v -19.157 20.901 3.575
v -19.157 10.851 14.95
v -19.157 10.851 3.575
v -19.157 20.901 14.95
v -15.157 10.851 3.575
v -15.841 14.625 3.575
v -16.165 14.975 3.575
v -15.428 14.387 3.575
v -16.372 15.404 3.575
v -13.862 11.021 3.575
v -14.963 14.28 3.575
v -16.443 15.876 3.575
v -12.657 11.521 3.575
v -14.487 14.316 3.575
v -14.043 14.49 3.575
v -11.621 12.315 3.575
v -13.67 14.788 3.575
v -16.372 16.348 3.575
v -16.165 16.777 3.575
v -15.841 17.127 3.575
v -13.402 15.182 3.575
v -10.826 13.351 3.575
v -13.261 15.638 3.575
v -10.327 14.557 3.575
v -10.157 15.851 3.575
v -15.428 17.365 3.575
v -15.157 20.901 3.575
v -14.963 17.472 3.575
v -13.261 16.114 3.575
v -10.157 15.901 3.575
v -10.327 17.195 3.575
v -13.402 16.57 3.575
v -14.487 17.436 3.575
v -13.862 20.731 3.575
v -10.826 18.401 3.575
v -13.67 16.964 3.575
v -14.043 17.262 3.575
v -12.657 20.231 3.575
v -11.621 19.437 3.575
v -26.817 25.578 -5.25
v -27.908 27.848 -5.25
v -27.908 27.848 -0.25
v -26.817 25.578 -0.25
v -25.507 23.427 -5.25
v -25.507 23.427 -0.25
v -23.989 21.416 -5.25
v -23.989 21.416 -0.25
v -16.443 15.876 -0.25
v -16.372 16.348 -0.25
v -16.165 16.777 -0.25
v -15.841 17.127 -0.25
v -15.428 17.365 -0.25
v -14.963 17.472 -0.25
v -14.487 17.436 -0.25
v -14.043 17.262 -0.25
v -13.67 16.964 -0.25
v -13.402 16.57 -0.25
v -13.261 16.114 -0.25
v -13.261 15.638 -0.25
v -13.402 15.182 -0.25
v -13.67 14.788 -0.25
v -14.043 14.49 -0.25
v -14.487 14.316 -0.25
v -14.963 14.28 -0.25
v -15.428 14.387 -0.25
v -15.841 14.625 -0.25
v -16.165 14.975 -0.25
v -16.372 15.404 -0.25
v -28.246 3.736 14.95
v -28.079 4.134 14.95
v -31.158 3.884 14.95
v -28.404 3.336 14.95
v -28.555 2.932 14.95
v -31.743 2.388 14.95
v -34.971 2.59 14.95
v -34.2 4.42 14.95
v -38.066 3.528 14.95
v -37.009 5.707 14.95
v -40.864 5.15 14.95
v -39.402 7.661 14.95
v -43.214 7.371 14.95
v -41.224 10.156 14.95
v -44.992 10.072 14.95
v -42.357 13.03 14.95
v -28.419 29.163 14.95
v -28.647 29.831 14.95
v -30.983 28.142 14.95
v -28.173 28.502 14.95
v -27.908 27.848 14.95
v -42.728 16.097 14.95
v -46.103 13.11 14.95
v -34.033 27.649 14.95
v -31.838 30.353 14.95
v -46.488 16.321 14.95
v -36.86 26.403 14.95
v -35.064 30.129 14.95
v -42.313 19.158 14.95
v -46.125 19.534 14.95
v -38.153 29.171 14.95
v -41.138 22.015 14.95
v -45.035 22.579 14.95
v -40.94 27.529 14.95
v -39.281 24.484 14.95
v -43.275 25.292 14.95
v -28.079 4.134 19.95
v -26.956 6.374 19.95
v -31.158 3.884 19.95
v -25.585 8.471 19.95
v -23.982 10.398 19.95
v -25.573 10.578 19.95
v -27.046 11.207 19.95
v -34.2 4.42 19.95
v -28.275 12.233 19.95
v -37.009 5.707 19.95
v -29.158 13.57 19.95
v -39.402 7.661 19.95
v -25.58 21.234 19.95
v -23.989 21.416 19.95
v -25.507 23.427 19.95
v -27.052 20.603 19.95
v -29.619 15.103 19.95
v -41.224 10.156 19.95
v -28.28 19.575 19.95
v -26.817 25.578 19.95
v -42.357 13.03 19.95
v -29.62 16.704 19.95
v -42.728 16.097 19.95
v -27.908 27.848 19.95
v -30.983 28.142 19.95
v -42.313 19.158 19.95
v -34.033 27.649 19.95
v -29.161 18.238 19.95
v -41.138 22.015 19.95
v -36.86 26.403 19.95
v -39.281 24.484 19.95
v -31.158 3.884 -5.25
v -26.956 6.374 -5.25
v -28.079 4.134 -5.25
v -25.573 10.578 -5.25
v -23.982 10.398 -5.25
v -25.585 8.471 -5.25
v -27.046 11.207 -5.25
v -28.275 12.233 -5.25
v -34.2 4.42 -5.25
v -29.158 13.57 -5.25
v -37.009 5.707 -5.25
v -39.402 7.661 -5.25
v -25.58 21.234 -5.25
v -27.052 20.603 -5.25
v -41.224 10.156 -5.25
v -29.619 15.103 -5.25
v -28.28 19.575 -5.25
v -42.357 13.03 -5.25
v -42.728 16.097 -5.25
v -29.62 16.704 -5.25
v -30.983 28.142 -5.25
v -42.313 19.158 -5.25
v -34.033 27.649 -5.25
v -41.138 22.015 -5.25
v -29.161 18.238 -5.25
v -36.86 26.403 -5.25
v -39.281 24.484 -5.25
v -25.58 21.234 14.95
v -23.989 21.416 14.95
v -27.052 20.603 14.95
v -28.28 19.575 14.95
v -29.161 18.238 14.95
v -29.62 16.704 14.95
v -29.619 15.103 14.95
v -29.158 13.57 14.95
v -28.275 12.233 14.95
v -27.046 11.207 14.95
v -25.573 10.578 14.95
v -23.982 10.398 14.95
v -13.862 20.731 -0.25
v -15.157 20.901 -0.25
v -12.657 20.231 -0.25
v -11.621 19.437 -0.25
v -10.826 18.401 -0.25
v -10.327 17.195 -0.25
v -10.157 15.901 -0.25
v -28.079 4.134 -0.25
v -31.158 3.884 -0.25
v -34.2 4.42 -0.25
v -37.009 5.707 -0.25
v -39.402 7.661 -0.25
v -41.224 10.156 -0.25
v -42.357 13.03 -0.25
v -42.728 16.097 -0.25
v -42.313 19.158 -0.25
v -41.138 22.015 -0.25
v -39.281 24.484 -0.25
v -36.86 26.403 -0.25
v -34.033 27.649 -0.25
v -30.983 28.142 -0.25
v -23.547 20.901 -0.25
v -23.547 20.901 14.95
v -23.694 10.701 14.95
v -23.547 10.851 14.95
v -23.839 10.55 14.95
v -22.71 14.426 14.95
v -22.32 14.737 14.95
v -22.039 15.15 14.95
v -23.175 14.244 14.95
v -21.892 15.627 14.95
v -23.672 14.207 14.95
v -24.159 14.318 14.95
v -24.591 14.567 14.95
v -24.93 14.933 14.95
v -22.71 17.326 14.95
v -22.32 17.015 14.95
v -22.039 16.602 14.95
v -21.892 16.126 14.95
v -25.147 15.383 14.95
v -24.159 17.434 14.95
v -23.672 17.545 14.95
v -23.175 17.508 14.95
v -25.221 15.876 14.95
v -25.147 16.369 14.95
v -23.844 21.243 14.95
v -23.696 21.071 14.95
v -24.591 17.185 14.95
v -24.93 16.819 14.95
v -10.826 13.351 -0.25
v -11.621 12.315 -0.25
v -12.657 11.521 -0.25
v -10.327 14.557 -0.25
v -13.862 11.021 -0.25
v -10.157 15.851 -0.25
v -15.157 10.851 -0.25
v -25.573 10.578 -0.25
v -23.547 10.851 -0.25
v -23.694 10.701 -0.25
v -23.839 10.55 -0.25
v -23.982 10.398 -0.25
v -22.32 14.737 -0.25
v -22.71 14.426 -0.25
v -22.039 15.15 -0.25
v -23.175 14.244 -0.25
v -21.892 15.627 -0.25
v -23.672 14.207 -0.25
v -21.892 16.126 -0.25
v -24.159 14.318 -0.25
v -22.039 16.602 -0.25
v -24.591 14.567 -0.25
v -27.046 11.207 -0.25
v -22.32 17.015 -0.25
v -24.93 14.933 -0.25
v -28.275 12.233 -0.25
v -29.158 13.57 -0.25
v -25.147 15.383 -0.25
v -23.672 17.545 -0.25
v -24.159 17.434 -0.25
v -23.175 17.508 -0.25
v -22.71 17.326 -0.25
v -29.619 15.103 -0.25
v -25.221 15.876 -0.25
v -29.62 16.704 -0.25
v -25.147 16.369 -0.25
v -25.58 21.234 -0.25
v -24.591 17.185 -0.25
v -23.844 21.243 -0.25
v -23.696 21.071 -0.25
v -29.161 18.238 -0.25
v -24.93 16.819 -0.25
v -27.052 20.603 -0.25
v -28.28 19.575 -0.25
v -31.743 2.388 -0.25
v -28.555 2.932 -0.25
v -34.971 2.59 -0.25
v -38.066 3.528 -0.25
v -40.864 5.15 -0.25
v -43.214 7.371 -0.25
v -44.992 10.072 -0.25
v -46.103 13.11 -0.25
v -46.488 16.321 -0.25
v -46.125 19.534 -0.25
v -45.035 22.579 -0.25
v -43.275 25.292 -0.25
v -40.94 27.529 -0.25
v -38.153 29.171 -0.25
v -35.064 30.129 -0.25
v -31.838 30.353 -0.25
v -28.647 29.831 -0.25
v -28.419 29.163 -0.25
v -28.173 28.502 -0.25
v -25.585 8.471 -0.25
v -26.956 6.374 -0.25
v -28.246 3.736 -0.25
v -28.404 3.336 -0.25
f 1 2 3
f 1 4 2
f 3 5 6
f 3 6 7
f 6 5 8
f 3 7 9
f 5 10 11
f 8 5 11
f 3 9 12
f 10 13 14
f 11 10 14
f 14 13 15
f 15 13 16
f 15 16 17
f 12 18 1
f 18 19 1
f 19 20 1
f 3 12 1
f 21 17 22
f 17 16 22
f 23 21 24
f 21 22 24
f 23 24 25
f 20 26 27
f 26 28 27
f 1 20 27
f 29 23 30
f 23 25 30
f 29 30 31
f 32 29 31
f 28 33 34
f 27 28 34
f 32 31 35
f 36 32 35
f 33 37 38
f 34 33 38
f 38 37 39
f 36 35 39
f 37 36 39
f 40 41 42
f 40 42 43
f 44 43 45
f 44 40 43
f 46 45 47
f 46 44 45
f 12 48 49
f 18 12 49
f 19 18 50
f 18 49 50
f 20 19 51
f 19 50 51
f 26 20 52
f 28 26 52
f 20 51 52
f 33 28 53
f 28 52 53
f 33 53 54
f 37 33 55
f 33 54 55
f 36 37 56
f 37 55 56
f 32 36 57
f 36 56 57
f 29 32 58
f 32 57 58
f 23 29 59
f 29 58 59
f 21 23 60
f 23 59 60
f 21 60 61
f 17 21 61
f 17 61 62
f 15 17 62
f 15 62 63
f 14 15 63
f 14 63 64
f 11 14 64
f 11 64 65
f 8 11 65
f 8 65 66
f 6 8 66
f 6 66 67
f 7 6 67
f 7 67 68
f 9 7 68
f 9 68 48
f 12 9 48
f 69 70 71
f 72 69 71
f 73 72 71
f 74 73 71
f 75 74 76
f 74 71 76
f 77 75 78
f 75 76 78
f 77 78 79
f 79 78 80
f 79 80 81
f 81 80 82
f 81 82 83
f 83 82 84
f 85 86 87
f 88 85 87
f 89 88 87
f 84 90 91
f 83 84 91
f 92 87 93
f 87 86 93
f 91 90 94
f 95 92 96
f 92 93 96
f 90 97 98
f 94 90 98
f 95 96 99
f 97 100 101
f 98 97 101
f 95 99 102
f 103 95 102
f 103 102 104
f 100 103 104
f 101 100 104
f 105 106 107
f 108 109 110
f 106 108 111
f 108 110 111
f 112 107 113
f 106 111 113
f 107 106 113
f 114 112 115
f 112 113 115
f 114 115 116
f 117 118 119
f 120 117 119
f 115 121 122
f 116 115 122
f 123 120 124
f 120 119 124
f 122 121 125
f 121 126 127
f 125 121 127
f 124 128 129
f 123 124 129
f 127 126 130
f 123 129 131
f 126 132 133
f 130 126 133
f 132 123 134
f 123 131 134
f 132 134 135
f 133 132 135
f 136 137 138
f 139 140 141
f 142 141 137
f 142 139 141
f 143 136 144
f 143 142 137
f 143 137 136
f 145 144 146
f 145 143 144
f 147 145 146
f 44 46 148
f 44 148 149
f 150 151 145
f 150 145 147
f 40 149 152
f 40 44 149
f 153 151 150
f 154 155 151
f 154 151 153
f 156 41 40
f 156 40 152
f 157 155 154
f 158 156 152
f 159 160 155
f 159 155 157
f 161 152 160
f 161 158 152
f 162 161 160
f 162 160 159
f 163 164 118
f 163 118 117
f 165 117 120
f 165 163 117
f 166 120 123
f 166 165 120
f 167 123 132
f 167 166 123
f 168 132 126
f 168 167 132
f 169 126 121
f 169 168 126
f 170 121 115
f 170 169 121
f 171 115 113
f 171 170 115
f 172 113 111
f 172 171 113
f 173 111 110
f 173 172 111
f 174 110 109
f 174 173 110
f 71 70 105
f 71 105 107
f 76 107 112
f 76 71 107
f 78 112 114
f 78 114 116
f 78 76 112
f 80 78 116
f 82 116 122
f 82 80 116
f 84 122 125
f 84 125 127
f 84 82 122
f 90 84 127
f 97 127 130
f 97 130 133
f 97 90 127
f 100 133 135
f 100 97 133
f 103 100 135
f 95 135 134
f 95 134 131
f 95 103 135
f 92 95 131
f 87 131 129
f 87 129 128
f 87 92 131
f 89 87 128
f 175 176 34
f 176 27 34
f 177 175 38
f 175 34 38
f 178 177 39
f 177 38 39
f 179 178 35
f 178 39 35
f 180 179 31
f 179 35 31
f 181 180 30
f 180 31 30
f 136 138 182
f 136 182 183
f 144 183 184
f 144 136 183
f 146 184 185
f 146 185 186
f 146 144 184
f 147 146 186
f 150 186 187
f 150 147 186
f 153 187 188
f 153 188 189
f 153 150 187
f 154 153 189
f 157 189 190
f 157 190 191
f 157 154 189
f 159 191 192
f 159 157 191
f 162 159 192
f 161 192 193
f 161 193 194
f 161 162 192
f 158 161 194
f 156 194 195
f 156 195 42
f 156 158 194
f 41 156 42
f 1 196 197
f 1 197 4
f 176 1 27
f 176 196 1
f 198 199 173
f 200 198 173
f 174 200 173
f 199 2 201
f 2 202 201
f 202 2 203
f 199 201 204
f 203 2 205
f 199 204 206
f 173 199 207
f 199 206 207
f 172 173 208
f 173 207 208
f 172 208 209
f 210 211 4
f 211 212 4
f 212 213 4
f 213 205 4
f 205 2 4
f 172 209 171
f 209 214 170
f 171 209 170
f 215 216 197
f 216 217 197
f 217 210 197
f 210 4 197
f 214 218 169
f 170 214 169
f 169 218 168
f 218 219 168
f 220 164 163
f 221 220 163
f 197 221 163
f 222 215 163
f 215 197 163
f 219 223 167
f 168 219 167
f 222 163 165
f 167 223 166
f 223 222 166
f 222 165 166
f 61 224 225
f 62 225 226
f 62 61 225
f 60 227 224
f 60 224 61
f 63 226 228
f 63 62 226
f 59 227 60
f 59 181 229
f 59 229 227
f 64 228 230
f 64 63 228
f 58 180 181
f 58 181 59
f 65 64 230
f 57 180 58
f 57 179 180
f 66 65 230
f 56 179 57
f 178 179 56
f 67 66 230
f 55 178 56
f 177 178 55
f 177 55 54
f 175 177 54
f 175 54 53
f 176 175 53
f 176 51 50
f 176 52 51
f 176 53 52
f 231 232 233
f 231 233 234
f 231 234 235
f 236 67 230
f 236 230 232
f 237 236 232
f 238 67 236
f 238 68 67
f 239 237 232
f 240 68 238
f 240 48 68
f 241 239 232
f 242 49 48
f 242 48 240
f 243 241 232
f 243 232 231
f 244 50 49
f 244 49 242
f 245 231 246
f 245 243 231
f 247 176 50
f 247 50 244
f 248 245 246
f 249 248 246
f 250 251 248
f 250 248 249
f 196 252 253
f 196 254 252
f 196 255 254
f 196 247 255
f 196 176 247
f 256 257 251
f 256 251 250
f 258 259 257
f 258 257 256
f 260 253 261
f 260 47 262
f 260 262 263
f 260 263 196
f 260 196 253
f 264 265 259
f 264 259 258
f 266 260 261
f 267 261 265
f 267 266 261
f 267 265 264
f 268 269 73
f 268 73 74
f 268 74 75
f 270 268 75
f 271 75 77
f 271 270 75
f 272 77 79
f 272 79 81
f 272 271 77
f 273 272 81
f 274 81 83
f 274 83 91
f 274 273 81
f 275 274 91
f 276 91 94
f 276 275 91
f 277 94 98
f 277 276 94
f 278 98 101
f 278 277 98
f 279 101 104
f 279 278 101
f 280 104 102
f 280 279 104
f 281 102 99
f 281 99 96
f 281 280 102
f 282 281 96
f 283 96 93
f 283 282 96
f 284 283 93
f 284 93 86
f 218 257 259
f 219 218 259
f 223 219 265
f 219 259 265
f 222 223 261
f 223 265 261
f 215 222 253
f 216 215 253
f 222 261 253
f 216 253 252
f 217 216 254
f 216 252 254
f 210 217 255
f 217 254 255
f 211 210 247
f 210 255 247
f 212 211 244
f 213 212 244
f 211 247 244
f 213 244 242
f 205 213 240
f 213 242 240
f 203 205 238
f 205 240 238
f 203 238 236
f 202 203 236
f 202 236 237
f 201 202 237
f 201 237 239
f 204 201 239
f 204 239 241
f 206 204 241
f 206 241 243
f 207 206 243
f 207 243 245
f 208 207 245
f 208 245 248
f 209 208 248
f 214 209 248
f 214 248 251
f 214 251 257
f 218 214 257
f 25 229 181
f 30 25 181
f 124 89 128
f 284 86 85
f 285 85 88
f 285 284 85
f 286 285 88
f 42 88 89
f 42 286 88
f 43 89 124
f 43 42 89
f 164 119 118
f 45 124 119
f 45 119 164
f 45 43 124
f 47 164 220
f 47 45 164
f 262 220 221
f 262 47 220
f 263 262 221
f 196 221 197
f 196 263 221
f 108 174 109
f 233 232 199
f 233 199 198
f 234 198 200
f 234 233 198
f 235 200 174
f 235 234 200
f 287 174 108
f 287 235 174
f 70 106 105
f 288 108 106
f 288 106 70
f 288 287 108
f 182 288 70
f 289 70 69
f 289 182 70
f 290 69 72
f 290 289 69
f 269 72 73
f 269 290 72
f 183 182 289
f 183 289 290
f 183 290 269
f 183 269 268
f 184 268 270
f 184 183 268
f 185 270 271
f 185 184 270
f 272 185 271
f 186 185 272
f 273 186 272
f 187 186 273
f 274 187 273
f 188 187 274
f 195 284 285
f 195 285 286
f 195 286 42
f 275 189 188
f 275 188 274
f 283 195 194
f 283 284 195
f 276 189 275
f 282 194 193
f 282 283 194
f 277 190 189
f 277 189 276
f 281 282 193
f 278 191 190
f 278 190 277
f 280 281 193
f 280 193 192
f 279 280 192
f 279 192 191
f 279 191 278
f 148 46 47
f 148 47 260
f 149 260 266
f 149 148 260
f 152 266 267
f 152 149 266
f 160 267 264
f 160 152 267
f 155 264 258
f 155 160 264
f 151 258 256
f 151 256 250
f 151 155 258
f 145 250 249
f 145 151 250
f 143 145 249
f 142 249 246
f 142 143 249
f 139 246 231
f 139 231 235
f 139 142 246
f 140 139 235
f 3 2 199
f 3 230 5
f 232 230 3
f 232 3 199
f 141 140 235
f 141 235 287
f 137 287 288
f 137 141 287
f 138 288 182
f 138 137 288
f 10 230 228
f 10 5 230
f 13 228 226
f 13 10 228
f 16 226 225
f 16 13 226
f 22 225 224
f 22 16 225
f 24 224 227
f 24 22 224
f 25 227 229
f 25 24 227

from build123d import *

# Parameters (mm, degrees)
EXTRUDE_1_DEPTH      = 2.2
EXTRUDE_2_DEPTH      = 3.25
SKETCH_3_W           = 50
SKETCH_3_H           = 10.05
EXTRUDE_3_DEPTH      = 3.25
CUT_EXTRUDE_1_DEPTH  = 30
EXTRUDE_4_REACH      = 56.389
SKETCH_6_R           = 5.025
SKETCH_8_R           = 1.675
SKETCH_8_R_2         = 0.84
CUT_EXTRUDE_3_DEPTH  = 55
SKETCH_9_W           = 28.473000816
SKETCH_9_H           = 14.532409192
CUT_EXTRUDE_4_DEPTH  = 3
EXTRUDE_5_DEPTH      = 2.45
SKETCH_11_W          = 12.614203935
SKETCH_11_H          = 10.05
EXTRUDE_6_DEPTH      = 3
SKETCH_12_W          = 36.628466797
SKETCH_12_H          = 15.348537224
CUT_EXTRUDE_5_DEPTH  = 10
SKETCH_13_W          = 5.35
SKETCH_13_H          = 5.35
CUT_EXTRUDE_6_DEPTH  = 14
SKETCH_14_R          = 1.1
CUT_EXTRUDE_7_DEPTH  = 14
SKETCH_15_R          = 1.1
CUT_EXTRUDE_8_DEPTH  = 10
SKETCH_16_R          = 1.625
EXTRUDE_7_DEPTH      = 5.7
SKETCH_17_W          = 19.923143876
SKETCH_17_H          = 15.083058075
CUT_EXTRUDE_9_DEPTH  = 3
SKETCH_18_R          = 1.675
SKETCH_18_R_2        = 1.6
CUT_EXTRUDE_10_DEPTH = 6
CUT_EXTRUDE_11_DEPTH = 10
EXTRUDE_8_DEPTH      = 9.5
EXTRUDE_9_DEPTH      = 15.2
SKETCH_23_W          = 14.793785908
SKETCH_23_H          = 11.59723546
CUT_EXTRUDE_12_DEPTH = 9
SKETCH_25_R          = 1.6
SKETCH_25_R_2        = 1.673969756
CUT_EXTRUDE_13_DEPTH = 20
FILLET_1_R           = 5
EXTRUDE_START        = 5
EXTRUDE_10_DEPTH     = 5
EXTRUDE_11_DEPTH     = 25.2


with BuildPart() as part:
    # 草图1 → 凸台-拉伸1 (new body)
    with BuildSketch(Plane.XY):
        with BuildLine():
            Line((1.539836705, 12.851012384), (15.55297303, 14.251012384))
            ThreePointArc((15.55297303, 14.251012384), (17.193415997, 16.063512384), (15.55297303, 17.876012384))
            Line((15.55297303, 17.876012384), (1.500532553, 18.901012384))
            ThreePointArc((1.500532553, 18.901012384), (0.527100583, 19.384612538), (-0.54702697, 19.551012384))
            Line((-0.54702697, 19.551012384), (-0.54702697, 20.901012384))
            Line((-0.54702697, 20.901012384), (19.51277613, 20.901012384))
            Line((19.51277613, 20.901012384), (41.45297303, 20.901012384))
            Line((41.45297303, 20.901012384), (41.45297303, 10.851012384))
            Line((41.45297303, 10.851012384), (-0.54702697, 10.851012384))
            Line((-0.54702697, 10.851012384), (-0.54702697, 12.201012384))
            ThreePointArc((-0.54702697, 12.201012384), (0.54584768, 12.367273294), (1.539836705, 12.851012384))
        make_face()
    extrude(amount=EXTRUDE_1_DEPTH)

    # 草图2 → 凸台-拉伸2 (add)
    with BuildSketch(Plane(origin=(0, 0, 0), x_dir=(-1, 0, 0), z_dir=(0, 0, -1))):
        Polygon((-19.51277613, 10.851012384), (-49.45297303, 10.851012384), (-49.45297303, 20.901012384), (-19.51277613, 20.901012384), (0.54702697, 20.901012384), (0.54702697, 10.851012384), align=None)
    extrude(amount=EXTRUDE_2_DEPTH)

    # 草图3 → 凸台-拉伸3 (add)
    with BuildSketch(Plane.XY.offset(2.2)):
        with Locations((24.45297303, 15.876012384)):
            Rectangle(SKETCH_3_W, SKETCH_3_H)
    extrude(amount=EXTRUDE_3_DEPTH)

    # 草图4 → 切除-拉伸1 (cut, symmetric)
    with BuildSketch(Plane.XY):
        with BuildLine():
            Line((-0.54702697, 19.551012384), (-2.235397712, 16.616091152))
            Line((-2.235397712, 16.616091152), (-1.110896638, 12.310548833))
            Line((-1.110896638, 12.310548833), (-0.54702697, 12.201012384))
            ThreePointArc((-0.54702697, 12.201012384), (0.54584768, 12.367273294), (1.539836705, 12.851012384))
            ThreePointArc((1.539836705, 12.851012384), (2.773180655, 15.88415254), (1.500532553, 18.901012384))
            ThreePointArc((1.500532553, 18.901012384), (0.527100583, 19.384612538), (-0.54702697, 19.551012384))
        make_face()
    extrude(amount=CUT_EXTRUDE_1_DEPTH, both=True, mode=Mode.SUBTRACT)

    # 凸台-拉伸4: up to this face of the body (flat: up to its plane)
    extrude_4_end = Plane(part.part.faces().sort_by_distance((25.407741746, 15.876338503, 5.45))[0])
    # 草图6 → 凸台-拉伸4 (add, up to the picked face)
    with BuildSketch(Plane(origin=(0, 0, -3.25), x_dir=(-1, 0, 0), z_dir=(0, 0, -1)), mode=Mode.PRIVATE) as extrude_4_sk1:
        with Locations(Location((-49.45297303, 15.876012384, 0), (0, 0, 90))):
            Circle(SKETCH_6_R)
    extrude_4_tool1 = split(extrude(extrude_4_sk1.sketch, amount=-EXTRUDE_4_REACH, mode=Mode.PRIVATE), bisect_by=extrude_4_end, keep=Keep.BOTH, mode=Mode.PRIVATE)
    add(extrude_4_tool1.solids().sort_by(Axis((49.452973, 15.876012, -3.25), (0, 0, 1)))[0])

    # 草图8 → 切除-拉伸3 (cut)
    with BuildSketch(Plane(origin=(0, 0, -3.25), x_dir=(-1, 0, 0), z_dir=(0, 0, -1))):
        with Locations((-49.45297303, 15.876012384)):
            Circle(SKETCH_8_R)
        with Locations(Location((-7.95297303, 15.856360308, 0), (0, 0, 180))):
            Circle(SKETCH_8_R_2)
    extrude(amount=-CUT_EXTRUDE_3_DEPTH, mode=Mode.SUBTRACT)

    # 草图9 → 切除-拉伸4 (cut)
    with BuildSketch(Plane(origin=(0, 0, -3.25), x_dir=(-1, 0, 0), z_dir=(0, 0, -1))):
        with Locations((-42.648638606, 15.039406696)):
            Rectangle(SKETCH_9_W, SKETCH_9_H)
    extrude(amount=-CUT_EXTRUDE_4_DEPTH, mode=Mode.SUBTRACT)

    # 草图10 → 凸台-拉伸5 (add)
    with BuildSketch(Plane(origin=(0, 0, 2.2), x_dir=(-1, 0, 0), z_dir=(0, 0, -1))):
        with BuildLine():
            Line((-49.45297303, 20.901012384), (-38.466384114, 20.901012384))
            Line((-38.466384114, 20.901012384), (-38.466384114, 10.851012384))
            Line((-38.466384114, 10.851012384), (-49.45297303, 10.851012384))
            ThreePointArc((-49.45297303, 10.851012384), (-46.217908976, 15.876012384), (-49.45297303, 20.901012384))
        make_face()
    extrude(amount=EXTRUDE_5_DEPTH)

    # 草图11 → 凸台-拉伸6 (add)
    with BuildSketch(Plane(origin=(0, 0, -3.25), x_dir=(-1, 0, 0), z_dir=(0, 0, -1))):
        with Locations((-32.625453647, 15.876012384)):
            Rectangle(SKETCH_11_W, SKETCH_11_H)
    extrude(amount=-EXTRUDE_6_DEPTH)

    # 草图12 → 切除-拉伸5 (cut)
    with BuildSketch(Plane(origin=(0, 0, -3.25), x_dir=(-1, 0, 0), z_dir=(0, 0, -1))):
        with Locations((-5.618322216, 15.103365543)):
            Rectangle(SKETCH_12_W, SKETCH_12_H)
    extrude(amount=-CUT_EXTRUDE_5_DEPTH, mode=Mode.SUBTRACT)

    # 草图13 → 切除-拉伸6 (cut)
    with BuildSketch(Plane.ZY.offset(-23.932555614)):
        with Locations((1.1, 16.124405573)):
            Rectangle(SKETCH_13_W, SKETCH_13_H)
    extrude(amount=-CUT_EXTRUDE_6_DEPTH, mode=Mode.SUBTRACT)

    # 草图14 → 切除-拉伸7 (cut)
    with BuildSketch(Plane(origin=(0, 20.901012384, 0), x_dir=(1, 0, 0), z_dir=(0, 1, 0))):
        with Locations(Location((30.538219594, -1.1, 0), (0, 0, 270))):
            Circle(SKETCH_14_R)
    extrude(amount=-CUT_EXTRUDE_7_DEPTH, mode=Mode.SUBTRACT)

    # 草图15 → 切除-拉伸8 (cut)
    with BuildSketch(Plane.XY.offset(5.45)):
        with Locations((36.879929969, 15.882801083)):
            Circle(SKETCH_15_R)
    extrude(amount=-CUT_EXTRUDE_8_DEPTH, mode=Mode.SUBTRACT)

    # 草图16 → 凸台-拉伸7 (add)
    with BuildSketch(Plane(origin=(0, 0, -0.25), x_dir=(-1, 0, 0), z_dir=(0, 0, -1))):
        with BuildLine():
            Line((-49.45297303, 20.901012384), (23.54702697, 20.901012384))
            ThreePointArc((23.54702697, 20.901012384), (28.57202697, 15.876012384), (23.54702697, 10.851012384))
            Line((23.54702697, 10.851012384), (-49.45297303, 10.851012384))
            Line((-49.45297303, 10.851012384), (-49.45297303, 20.901012384))
        make_face()
        with Locations((23.54702697, 15.876012384)):
            Circle(SKETCH_16_R, mode=Mode.SUBTRACT)
    extrude(amount=-EXTRUDE_7_DEPTH)

    # 草图17 → 切除-拉伸9 (cut)
    with BuildSketch(Plane(origin=(0, 0, -3.25), x_dir=(-1, 0, 0), z_dir=(0, 0, -1))):
        with Locations((-33.178239607, 16.007261263)):
            Rectangle(SKETCH_17_W, SKETCH_17_H)
    extrude(amount=-CUT_EXTRUDE_9_DEPTH, mode=Mode.SUBTRACT)

    # 草图18 → 切除-拉伸10 (cut)
    with BuildSketch(Plane(origin=(0, 0, -0.25), x_dir=(-1, 0, 0), z_dir=(0, 0, -1))):
        with Locations(Location((-49.45297303, 15.876012384, 0), (0, 0, 180))):
            Circle(SKETCH_18_R)
        with Locations((14.84318256, 15.876012384)):
            Circle(SKETCH_18_R_2)
        with BuildLine():
            Line((-31.661597205, 17.303258867), (8.461046927, 17.303258867))
            ThreePointArc((8.461046927, 17.303258867), (9.88829341, 15.876012384), (8.461046927, 14.448765901))
            Line((8.461046927, 14.448765901), (-31.661597205, 14.448765901))
            ThreePointArc((-31.661597205, 14.448765901), (-33.088843687, 15.876012384), (-31.661597205, 17.303258867))
        make_face()
    extrude(amount=-CUT_EXTRUDE_10_DEPTH, mode=Mode.SUBTRACT)

    # 草图19 → 切除-拉伸11 (cut)
    with BuildSketch(Plane(origin=(0, 0, -0.25), x_dir=(-1, 0, 0), z_dir=(0, 0, -1))):
        Polygon((12.697516125, 20.901012384), (-60.999534113, 39.375054119), (-58.738783937, -10.22846445), (12.697516125, 10.851012384), (10.156545193, 10.851012384), (10.156545193, 20.901012384), align=None)
    extrude(amount=-CUT_EXTRUDE_11_DEPTH, mode=Mode.SUBTRACT)

    # 草图21 → 凸台-拉伸8 (add)
    with BuildSketch(Plane.XY.offset(5.45)):
        with BuildLine():
            Line((-23.54702697, 20.901012384), (-12.697516125, 20.901012384))
            ThreePointArc((-12.697516125, 20.901012384), (-9.87974938, 15.876012384), (-12.697516125, 10.851012384))
            Line((-12.697516125, 10.851012384), (-23.54702697, 10.851012384))
            ThreePointArc((-23.54702697, 10.851012384), (-28.57202697, 15.876012384), (-23.54702697, 20.901012384))
        make_face()
    extrude(amount=EXTRUDE_8_DEPTH)

    # 草图22 → 凸台-拉伸9 (add)
    with BuildSketch(Plane(origin=(0, 0, -0.25), x_dir=(-1, 0, 0), z_dir=(0, 0, -1))):
        with BuildLine():
            Line((23.54702697, 20.901012384), (26.601137036, 16.368267617))
            Line((26.601137036, 16.368267617), (23.54702697, 10.851012384))
            ThreePointArc((23.54702697, 10.851012384), (26.480521945, 7.163010653), (28.555320944, 2.931940027))
            ThreePointArc((28.555320944, 2.931940027), (46.487809448, 16.320719833), (28.64667794, 29.830997223))
            ThreePointArc((28.64667794, 29.830997223), (26.554002303, 25.104940008), (23.54702697, 20.901012384))
        make_face()
    extrude(amount=-EXTRUDE_9_DEPTH)

    # 草图23 → 切除-拉伸12 (cut, symmetric)
    with BuildSketch(Plane(origin=(-10.156545193, 0, 0), x_dir=(0, 0, -1), z_dir=(1, 0, 0))):
        with Locations((-10.971714959, 15.6975909)):
            Rectangle(SKETCH_23_W, SKETCH_23_H)
    extrude(amount=CUT_EXTRUDE_12_DEPTH, both=True, mode=Mode.SUBTRACT)

    # 草图25 → 切除-拉伸13 (cut)
    with BuildSketch(Plane(origin=(0, 0, -0.25), x_dir=(-1, 0, 0), z_dir=(0, 0, -1))):
        with Locations((14.84318256, 15.876012384)):
            Circle(SKETCH_25_R)
        with Locations((23.54702697, 15.876012384)):
            Circle(SKETCH_25_R_2)
    extrude(amount=-CUT_EXTRUDE_13_DEPTH, mode=Mode.SUBTRACT)

    # 圆角1
    fillet_1_edges = [part.edges().sort_by_distance(p)[0] for p in [
        (-10.156545193, 10.851012384, 1.662411002),
        (-10.156545193, 20.901012384, 1.662411002),
    ]]
    fillet(fillet_1_edges, radius=FILLET_1_R)

    # 草图26 → 凸台-拉伸10 (add)
    with BuildSketch(Plane(origin=(0, 0, -0.25), x_dir=(-1, 0, 0), z_dir=(0, 0, -1)).offset(EXTRUDE_START)):
        with BuildLine():
            ThreePointArc((23.989483385, 21.41624515), (29.677771388, 15.903479456), (23.982335647, 10.398098659))
            ThreePointArc((23.982335647, 10.398098659), (26.300788095, 7.442479058), (28.078905502, 4.133520391))
            ThreePointArc((28.078905502, 4.133520391), (42.727883136, 16.096897132), (27.908169911, 27.848111056))
            ThreePointArc((27.908169911, 27.848111056), (26.188805201, 24.485968475), (23.989483385, 21.41624515))
        make_face()
    extrude(amount=-EXTRUDE_10_DEPTH)

    # 草图27 → 凸台-拉伸11 (add)
    with BuildSketch(Plane(origin=(0, 0, -5.25), x_dir=(-1, 0, 0), z_dir=(0, 0, -1))):
        with BuildLine():
            ThreePointArc((23.989483385, 21.41624515), (29.677771388, 15.903479456), (23.982335647, 10.398098659))
            ThreePointArc((23.982335647, 10.398098659), (26.300788095, 7.442479058), (28.078905502, 4.133520391))
            ThreePointArc((28.078905502, 4.133520391), (42.727883136, 16.096897132), (27.908169911, 27.848111056))
            ThreePointArc((27.908169911, 27.848111056), (26.188805201, 24.485968475), (23.989483385, 21.41624515))
        make_face()
    extrude(amount=-EXTRUDE_11_DEPTH)


solid = part.part
